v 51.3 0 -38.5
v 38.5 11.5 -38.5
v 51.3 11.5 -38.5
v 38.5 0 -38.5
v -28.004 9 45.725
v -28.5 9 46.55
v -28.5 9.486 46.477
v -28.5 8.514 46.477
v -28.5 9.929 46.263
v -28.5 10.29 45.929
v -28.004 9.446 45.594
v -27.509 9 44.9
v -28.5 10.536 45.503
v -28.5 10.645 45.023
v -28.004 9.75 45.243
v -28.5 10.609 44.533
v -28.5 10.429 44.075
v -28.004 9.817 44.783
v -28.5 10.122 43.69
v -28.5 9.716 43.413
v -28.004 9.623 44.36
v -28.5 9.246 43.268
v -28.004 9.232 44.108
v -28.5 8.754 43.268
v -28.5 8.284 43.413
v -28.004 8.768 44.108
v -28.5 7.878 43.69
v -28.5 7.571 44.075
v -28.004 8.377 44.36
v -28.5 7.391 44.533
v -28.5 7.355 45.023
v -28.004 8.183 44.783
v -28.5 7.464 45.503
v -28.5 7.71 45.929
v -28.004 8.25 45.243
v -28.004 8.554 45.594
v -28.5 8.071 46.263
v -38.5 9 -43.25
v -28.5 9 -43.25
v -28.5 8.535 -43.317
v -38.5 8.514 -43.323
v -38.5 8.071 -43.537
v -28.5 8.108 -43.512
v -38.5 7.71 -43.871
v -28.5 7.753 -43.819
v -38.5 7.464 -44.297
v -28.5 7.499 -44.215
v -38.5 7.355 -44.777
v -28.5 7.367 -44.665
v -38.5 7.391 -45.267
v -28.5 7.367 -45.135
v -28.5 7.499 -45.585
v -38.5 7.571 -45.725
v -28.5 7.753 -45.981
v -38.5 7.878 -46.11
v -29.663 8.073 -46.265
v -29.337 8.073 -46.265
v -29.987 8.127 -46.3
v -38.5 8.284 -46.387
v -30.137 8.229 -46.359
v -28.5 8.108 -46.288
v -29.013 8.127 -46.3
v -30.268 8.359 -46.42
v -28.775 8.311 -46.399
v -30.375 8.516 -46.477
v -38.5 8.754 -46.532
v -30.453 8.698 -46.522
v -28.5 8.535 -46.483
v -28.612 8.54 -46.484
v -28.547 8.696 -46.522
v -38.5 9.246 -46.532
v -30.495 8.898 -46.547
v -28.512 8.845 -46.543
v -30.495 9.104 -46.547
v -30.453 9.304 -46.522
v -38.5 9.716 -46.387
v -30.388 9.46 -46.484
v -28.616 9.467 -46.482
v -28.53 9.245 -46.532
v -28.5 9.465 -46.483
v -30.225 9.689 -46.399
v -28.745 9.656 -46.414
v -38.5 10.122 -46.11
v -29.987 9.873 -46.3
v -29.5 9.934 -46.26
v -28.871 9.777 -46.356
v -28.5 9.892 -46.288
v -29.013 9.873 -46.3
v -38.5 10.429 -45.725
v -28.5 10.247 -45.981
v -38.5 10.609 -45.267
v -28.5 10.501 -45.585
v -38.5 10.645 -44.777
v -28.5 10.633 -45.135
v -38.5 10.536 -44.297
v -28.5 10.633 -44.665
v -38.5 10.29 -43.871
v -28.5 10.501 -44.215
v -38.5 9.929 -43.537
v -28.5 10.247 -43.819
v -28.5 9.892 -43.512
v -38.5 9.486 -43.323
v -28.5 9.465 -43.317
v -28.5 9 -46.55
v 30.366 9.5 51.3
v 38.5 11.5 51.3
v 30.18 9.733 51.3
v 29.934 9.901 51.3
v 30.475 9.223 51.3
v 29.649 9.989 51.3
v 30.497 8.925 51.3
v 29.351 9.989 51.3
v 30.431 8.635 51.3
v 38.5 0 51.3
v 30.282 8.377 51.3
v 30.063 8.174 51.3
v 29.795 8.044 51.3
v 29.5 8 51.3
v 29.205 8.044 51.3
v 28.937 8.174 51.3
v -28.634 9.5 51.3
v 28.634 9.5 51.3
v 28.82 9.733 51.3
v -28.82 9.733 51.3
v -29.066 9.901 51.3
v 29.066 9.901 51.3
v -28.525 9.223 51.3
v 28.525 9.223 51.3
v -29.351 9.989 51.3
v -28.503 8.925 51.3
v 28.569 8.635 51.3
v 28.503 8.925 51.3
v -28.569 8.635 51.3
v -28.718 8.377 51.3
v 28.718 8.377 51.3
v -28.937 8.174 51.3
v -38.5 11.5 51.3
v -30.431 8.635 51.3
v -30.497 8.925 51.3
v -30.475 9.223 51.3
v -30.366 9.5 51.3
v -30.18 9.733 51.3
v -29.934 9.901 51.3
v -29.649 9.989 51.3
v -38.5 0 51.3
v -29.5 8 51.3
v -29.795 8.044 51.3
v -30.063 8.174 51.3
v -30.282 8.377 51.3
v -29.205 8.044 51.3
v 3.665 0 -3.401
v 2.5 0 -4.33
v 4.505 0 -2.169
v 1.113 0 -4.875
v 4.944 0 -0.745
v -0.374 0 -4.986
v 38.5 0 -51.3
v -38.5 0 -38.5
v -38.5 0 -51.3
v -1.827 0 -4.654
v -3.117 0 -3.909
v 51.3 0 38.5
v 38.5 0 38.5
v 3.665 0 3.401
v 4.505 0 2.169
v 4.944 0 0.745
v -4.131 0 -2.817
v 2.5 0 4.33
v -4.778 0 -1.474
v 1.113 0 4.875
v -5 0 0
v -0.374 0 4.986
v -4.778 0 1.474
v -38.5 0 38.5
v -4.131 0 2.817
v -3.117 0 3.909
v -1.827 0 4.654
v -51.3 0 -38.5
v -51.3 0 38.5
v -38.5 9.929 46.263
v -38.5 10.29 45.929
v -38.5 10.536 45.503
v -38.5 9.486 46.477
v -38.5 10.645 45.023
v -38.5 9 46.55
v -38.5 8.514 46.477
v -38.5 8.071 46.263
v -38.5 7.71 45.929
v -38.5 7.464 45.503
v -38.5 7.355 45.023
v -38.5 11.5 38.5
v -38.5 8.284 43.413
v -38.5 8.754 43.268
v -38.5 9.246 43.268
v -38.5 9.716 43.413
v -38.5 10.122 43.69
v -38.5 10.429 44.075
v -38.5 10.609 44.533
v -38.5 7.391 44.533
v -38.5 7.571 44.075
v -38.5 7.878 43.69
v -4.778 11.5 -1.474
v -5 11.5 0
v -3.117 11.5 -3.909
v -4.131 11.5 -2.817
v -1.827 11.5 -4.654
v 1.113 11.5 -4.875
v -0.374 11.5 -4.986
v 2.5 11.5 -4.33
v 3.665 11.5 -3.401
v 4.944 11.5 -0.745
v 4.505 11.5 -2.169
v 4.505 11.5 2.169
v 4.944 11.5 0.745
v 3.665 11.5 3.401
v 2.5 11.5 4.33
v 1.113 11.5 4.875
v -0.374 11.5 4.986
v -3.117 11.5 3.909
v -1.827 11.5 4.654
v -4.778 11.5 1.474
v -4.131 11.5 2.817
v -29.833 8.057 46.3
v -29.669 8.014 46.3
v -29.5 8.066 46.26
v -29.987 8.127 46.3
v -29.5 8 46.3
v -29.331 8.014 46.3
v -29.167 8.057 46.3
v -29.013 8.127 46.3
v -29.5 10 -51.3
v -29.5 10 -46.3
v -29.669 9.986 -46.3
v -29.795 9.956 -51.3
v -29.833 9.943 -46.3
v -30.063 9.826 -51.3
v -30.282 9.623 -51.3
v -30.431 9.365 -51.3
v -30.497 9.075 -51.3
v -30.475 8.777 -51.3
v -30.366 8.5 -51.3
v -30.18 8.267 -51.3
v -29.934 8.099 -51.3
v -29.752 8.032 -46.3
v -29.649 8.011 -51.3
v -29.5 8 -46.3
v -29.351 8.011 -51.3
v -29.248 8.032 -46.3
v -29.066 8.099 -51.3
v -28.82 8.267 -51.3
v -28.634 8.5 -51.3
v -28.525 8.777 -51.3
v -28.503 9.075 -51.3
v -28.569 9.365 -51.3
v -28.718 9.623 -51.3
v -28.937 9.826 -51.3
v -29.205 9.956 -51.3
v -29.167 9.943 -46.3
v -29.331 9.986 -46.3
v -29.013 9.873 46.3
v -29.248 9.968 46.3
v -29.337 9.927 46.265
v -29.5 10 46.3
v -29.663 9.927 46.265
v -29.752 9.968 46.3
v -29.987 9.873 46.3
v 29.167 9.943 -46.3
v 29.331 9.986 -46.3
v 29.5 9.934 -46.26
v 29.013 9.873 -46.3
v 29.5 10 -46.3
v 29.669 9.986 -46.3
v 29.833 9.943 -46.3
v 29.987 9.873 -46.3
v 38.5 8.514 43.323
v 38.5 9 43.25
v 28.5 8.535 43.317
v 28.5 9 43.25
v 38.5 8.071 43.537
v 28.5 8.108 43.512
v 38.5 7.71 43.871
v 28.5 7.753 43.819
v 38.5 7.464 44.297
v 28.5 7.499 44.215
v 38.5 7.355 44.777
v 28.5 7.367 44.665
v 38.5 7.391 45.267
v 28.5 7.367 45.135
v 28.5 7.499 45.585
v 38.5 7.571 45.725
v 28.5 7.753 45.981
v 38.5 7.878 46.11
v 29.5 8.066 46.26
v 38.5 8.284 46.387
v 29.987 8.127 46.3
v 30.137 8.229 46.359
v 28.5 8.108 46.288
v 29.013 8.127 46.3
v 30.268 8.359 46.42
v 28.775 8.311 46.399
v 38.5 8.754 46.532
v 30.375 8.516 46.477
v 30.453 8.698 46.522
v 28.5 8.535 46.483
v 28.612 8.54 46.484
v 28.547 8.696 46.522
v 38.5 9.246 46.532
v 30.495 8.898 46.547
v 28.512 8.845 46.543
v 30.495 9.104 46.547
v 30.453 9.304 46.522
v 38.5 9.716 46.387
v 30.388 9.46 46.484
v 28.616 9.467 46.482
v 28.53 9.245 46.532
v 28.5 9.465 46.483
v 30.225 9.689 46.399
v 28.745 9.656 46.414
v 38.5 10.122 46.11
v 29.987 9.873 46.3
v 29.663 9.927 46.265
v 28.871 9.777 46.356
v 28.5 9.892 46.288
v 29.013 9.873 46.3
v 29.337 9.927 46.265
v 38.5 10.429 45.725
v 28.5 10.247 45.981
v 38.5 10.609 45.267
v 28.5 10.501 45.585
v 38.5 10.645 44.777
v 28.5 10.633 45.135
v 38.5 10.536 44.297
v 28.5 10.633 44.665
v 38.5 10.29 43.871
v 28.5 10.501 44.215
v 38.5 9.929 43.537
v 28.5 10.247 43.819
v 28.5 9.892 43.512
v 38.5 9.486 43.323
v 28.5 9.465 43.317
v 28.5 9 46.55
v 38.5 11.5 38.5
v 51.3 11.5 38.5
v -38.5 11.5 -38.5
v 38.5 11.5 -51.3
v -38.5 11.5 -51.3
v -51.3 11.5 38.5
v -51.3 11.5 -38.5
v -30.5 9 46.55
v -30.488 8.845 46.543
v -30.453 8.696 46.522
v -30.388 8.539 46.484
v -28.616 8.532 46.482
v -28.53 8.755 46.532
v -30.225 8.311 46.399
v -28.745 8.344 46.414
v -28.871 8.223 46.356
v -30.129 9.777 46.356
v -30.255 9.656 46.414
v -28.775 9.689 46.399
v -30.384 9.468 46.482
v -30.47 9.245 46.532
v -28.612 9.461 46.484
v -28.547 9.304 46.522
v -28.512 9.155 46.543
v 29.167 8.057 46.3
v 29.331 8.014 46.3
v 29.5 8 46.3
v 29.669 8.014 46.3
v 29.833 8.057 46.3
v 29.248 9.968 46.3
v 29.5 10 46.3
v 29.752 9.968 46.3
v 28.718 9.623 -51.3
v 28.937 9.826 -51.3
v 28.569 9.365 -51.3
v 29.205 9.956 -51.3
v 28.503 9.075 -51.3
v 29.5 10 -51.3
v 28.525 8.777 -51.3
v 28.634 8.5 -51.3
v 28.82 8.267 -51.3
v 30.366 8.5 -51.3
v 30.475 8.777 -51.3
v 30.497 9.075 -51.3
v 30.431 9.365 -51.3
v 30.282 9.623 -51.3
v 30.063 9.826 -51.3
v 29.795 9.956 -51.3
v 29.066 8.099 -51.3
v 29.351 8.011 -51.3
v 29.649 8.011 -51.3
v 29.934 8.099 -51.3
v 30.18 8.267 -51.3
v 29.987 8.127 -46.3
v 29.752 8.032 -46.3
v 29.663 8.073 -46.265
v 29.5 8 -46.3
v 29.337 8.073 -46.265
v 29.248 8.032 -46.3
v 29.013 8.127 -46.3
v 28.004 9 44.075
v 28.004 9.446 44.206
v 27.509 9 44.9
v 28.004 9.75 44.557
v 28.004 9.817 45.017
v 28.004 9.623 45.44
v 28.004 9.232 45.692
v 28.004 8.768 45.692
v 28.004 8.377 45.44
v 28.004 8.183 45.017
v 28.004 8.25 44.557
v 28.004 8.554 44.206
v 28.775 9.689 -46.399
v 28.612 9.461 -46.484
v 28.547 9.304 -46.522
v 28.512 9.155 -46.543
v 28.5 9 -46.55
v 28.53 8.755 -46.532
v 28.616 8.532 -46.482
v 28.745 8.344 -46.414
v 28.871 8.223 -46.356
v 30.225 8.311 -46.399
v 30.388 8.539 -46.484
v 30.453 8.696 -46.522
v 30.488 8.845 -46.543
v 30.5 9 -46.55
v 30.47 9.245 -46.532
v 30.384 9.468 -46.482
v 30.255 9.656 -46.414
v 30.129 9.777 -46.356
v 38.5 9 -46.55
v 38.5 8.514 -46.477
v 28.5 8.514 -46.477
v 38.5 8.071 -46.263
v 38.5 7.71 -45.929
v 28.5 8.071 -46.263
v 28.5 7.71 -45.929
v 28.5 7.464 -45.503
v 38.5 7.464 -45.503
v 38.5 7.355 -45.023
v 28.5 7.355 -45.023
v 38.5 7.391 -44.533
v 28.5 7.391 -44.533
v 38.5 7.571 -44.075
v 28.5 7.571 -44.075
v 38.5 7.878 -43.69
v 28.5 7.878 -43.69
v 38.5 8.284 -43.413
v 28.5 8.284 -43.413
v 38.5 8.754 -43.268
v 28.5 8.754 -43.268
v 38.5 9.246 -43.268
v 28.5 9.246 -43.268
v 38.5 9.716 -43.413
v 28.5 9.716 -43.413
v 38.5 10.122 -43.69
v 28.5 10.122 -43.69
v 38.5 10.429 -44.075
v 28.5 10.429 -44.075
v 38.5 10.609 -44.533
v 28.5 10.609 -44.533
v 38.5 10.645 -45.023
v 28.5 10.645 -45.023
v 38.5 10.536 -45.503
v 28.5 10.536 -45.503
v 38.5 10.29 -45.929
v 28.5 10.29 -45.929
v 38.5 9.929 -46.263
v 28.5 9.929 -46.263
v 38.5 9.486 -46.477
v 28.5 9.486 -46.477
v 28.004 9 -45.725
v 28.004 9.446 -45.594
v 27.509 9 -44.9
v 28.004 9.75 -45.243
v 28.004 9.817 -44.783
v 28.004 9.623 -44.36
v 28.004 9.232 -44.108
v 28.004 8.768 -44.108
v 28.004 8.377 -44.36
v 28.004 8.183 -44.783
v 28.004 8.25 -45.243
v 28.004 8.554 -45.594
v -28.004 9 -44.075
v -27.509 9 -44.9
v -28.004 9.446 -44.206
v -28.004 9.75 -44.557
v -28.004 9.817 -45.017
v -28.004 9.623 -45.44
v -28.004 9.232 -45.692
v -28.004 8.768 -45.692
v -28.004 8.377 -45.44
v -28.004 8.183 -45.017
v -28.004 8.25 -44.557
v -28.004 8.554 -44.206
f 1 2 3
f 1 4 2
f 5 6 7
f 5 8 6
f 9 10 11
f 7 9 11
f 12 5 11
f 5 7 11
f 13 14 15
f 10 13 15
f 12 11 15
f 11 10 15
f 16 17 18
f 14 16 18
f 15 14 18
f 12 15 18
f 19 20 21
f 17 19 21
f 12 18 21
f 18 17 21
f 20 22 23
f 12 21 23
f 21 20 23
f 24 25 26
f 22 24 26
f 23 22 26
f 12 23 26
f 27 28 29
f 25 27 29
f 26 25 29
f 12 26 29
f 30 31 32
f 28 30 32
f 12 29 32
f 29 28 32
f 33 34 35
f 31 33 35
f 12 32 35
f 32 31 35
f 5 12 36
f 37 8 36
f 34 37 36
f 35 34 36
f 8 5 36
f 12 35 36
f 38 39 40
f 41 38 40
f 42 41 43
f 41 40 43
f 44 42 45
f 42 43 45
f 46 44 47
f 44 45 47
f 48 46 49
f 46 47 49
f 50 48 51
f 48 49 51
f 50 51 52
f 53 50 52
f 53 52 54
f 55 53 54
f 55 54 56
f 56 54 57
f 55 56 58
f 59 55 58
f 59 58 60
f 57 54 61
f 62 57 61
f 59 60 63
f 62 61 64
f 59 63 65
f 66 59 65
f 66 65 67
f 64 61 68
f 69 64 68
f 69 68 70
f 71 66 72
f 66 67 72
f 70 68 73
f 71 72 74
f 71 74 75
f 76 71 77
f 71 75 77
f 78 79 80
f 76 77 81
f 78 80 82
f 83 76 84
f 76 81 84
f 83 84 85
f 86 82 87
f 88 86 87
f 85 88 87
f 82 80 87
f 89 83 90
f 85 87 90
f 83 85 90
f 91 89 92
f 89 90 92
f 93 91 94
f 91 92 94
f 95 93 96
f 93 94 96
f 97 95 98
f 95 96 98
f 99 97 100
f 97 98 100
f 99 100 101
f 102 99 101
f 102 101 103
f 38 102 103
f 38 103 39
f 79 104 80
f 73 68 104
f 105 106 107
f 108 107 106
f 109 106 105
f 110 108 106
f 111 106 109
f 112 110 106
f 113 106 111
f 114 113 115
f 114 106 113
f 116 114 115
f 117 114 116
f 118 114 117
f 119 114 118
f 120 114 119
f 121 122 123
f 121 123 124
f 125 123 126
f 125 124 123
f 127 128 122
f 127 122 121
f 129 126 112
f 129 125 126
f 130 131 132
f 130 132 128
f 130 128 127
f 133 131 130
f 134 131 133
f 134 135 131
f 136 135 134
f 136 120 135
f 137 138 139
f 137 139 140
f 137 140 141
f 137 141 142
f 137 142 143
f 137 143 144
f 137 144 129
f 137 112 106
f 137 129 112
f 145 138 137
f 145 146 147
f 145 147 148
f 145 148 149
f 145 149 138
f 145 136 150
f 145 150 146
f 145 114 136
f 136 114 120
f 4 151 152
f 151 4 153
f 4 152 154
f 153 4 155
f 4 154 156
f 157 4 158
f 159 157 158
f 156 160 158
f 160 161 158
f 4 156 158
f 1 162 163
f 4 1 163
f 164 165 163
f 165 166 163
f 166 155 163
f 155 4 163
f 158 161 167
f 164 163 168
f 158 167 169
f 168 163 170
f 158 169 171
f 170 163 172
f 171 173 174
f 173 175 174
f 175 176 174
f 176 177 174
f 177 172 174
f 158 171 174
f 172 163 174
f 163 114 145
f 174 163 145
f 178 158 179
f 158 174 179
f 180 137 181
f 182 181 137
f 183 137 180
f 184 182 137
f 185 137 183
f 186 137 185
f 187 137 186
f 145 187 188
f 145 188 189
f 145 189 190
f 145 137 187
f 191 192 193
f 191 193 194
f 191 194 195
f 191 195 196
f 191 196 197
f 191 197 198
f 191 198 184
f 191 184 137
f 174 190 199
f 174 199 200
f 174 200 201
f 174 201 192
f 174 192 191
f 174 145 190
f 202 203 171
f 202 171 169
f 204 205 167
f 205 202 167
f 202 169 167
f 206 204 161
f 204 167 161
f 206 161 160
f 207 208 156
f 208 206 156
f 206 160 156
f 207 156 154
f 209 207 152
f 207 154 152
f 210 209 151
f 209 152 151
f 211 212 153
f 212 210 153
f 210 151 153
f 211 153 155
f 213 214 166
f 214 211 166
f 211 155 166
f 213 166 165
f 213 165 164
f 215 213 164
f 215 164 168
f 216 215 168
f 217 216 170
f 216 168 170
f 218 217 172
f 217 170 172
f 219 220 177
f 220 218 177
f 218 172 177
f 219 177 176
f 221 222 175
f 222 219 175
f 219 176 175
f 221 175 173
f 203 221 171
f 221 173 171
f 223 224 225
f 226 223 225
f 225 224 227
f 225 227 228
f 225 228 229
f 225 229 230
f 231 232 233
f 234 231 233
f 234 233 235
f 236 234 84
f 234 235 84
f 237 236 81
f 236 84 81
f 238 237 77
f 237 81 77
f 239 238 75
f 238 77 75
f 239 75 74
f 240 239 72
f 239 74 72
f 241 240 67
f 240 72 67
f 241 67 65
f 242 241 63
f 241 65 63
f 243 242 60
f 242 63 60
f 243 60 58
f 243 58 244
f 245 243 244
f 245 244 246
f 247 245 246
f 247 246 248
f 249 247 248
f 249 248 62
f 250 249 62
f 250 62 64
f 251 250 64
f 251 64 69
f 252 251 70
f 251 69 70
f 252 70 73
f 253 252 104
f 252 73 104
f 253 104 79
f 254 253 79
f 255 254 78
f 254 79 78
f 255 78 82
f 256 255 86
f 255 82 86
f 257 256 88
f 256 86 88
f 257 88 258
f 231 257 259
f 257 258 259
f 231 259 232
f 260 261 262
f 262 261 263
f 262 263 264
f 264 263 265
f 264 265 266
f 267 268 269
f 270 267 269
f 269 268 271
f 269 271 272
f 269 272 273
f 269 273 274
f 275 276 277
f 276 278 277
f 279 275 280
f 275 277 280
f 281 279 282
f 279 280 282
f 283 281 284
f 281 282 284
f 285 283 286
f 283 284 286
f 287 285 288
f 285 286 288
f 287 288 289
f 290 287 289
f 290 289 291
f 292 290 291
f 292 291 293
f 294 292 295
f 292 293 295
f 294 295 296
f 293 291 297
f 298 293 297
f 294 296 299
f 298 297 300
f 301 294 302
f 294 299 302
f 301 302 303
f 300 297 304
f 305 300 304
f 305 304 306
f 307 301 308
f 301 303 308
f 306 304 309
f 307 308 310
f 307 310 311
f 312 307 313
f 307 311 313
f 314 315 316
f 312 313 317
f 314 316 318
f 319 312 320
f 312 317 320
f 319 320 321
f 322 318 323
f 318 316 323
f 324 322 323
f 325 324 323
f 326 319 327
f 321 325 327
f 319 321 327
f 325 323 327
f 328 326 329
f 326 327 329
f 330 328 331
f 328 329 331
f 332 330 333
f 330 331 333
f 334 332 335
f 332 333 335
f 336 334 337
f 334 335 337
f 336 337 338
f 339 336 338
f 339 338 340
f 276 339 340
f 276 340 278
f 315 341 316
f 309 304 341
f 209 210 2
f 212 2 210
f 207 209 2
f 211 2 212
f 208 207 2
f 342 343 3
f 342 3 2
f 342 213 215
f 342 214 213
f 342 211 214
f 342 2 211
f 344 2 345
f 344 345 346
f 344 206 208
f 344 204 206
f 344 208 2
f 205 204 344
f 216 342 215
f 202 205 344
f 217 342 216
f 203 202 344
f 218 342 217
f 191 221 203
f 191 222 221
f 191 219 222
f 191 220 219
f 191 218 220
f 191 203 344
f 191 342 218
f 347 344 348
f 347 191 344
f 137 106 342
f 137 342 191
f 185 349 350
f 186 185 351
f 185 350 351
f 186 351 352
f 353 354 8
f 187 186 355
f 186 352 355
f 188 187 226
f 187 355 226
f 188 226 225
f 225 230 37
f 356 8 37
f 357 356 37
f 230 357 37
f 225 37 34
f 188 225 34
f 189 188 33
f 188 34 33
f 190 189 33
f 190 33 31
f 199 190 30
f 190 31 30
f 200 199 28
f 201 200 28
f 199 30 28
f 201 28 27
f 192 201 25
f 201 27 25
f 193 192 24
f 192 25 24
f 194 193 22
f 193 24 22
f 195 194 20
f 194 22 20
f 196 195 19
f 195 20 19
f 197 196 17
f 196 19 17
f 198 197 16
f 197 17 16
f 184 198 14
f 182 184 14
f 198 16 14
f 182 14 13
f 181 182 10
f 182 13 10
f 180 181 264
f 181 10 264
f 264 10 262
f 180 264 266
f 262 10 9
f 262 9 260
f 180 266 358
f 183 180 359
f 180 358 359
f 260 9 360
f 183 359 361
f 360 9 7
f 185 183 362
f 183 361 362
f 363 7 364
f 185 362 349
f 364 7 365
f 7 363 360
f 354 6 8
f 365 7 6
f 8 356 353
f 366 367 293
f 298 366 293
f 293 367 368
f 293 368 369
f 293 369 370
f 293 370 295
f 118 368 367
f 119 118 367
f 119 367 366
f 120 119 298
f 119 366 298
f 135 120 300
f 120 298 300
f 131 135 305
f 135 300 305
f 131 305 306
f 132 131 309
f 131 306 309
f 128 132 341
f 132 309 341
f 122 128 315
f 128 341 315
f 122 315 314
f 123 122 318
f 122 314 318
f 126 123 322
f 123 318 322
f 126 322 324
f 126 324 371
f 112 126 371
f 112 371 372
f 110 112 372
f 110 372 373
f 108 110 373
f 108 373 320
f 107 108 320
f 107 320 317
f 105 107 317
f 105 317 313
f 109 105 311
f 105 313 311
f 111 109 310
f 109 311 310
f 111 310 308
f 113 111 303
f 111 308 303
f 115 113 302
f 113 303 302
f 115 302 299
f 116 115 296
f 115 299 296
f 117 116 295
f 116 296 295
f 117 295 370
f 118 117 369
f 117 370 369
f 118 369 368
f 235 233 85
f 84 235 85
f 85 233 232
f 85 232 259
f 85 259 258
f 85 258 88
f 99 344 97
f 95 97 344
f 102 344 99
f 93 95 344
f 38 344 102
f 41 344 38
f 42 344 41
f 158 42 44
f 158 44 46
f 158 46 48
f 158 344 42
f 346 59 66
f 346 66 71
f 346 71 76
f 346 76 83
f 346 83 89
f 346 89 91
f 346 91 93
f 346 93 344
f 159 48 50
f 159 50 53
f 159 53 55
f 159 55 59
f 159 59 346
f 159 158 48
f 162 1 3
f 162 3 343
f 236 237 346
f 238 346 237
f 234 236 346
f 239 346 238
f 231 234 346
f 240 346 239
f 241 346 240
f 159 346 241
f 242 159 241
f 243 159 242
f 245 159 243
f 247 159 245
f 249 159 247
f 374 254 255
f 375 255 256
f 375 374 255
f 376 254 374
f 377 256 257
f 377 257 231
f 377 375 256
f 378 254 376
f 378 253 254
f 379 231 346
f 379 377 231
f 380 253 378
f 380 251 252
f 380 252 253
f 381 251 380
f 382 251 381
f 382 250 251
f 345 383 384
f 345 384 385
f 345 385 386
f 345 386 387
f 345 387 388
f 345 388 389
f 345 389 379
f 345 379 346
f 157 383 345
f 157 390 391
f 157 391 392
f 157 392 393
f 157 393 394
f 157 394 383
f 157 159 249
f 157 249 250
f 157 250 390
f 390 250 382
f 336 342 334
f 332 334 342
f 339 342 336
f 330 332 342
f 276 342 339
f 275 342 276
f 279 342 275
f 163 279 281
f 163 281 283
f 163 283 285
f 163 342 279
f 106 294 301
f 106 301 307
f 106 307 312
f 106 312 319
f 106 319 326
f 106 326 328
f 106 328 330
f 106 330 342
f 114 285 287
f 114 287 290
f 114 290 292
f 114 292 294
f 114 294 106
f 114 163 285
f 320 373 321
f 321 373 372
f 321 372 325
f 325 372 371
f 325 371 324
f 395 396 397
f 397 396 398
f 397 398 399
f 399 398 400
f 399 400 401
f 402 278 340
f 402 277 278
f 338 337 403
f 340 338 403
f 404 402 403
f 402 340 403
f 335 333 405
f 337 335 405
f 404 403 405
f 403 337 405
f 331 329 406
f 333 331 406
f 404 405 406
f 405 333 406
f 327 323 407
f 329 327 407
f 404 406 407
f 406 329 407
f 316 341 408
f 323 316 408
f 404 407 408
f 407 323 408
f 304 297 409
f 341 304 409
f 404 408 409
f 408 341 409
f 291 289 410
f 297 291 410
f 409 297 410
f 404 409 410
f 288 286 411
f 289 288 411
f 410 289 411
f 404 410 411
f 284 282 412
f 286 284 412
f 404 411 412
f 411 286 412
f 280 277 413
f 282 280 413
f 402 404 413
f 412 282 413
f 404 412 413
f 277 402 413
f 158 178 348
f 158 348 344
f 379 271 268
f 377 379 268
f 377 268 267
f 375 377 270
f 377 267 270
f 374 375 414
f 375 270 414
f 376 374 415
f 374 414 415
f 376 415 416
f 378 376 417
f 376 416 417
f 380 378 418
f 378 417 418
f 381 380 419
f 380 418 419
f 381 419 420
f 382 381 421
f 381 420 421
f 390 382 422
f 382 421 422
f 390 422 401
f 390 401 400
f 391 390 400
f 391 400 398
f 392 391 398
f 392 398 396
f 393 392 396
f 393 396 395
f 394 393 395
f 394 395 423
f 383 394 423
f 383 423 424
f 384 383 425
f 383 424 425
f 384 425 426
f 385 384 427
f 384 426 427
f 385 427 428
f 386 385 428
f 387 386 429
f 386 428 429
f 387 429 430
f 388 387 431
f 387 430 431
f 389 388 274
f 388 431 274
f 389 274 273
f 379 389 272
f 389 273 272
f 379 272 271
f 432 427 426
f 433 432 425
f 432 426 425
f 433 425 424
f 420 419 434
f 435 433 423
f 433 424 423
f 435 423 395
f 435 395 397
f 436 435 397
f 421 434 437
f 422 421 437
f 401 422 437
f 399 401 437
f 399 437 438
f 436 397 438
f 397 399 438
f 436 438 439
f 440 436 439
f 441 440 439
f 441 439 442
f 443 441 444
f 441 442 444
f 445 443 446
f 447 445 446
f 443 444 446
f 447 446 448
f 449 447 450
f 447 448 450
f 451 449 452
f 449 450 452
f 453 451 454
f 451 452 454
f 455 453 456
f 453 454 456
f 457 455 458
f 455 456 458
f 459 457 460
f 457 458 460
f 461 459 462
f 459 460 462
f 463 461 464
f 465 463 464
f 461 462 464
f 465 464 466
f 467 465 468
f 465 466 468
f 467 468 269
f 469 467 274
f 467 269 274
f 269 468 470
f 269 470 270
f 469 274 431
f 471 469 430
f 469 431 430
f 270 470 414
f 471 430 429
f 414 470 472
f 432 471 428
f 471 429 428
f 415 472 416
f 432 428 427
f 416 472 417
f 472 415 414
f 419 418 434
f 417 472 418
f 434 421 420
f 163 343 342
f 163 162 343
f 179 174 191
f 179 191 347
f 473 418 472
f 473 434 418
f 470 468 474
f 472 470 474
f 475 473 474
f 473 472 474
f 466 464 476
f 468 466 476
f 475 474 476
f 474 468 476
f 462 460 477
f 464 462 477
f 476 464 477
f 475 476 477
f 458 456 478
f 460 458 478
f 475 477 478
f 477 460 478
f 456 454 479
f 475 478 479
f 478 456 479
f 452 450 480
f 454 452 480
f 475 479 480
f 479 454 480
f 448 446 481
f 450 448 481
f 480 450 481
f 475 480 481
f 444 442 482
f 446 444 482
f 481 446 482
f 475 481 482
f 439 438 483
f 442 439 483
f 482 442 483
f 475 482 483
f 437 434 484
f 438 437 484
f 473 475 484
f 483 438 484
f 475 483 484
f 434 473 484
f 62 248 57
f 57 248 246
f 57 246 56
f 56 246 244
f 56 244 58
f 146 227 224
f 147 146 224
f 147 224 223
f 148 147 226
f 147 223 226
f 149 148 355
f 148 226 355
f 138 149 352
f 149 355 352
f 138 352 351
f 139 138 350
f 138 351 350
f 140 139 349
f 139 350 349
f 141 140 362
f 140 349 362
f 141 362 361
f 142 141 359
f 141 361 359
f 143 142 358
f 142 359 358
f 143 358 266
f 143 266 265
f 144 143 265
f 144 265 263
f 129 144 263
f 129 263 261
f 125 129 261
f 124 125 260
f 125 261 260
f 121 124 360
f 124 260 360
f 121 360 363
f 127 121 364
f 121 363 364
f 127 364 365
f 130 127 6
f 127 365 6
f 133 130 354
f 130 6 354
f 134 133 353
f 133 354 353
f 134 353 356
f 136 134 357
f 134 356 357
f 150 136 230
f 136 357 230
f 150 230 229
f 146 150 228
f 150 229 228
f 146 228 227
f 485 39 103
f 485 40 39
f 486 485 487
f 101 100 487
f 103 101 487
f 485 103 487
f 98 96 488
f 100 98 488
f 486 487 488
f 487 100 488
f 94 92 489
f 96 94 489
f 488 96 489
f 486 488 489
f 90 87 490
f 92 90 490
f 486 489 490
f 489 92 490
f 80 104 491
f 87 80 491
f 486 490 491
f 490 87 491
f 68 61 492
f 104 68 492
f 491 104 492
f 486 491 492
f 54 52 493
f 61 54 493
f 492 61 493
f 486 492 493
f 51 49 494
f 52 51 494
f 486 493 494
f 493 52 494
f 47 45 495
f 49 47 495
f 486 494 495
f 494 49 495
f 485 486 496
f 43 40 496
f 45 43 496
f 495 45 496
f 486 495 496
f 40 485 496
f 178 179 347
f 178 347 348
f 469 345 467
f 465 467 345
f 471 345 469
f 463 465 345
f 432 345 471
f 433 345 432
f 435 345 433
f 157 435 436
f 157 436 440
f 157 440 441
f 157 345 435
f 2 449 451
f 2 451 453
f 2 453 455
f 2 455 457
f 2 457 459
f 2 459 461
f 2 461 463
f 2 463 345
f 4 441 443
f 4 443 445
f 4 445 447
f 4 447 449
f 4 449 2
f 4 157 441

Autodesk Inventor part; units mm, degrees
ref_plane "YZ Plane" through (0, 0, 0) normal (1, 0, 0) x (0, 1, 0)
ref_plane "XZ Plane" through (0, 0, 0) normal (0, 1, 0) x (-1, 0, 0)
ref_plane "XY Plane" through (0, 0, 0) normal (0, 0, 1) x (1, 0, 0)
sketch "Sketch1" plane through (0, 0, 0) normal (0, 1, 0) x (-1, 0, 0)
  line L0 (51.3, 38.5) -> (51.3, -38.5)
  line L1 (51.3, -38.5) -> (38.5, -38.5)
  line L2 (38.5, -38.5) -> (38.5, -51.3)
  line L3 (38.5, -51.3) -> (-38.5, -51.3)
  line L4 (-38.5, -51.3) -> (-38.5, -38.5)
  line L5 (-38.5, -38.5) -> (-51.3, -38.5)
  line L6 (-51.3, -38.5) -> (-51.3, 38.5)
  line L7 (-51.3, 38.5) -> (-38.5, 38.5)
  line L8 (-38.5, 38.5) -> (-38.5, 51.3)
  line L9 (-38.5, 51.3) -> (38.5, 51.3)
  line L10 (38.5, 51.3) -> (38.5, 38.5)
  line L11 (38.5, 38.5) -> (51.3, 38.5)
  circle A0 centre (0, 0) radius 5
  dimension "d0" = 77
  dimension "d1" = 12.8
  dimension "d2" = 12.8
  dimension "d3" = 77
  dimension "d4" = 12.8
  dimension "d5" = 12.8
  dimension "d6" = 77
  dimension "d7" = 12.8
  dimension "d8" = 12.8
  dimension "d9" = 77
  dimension "d10" = 12.8
  dimension "d11" = 12.8
  dimension "d12" = 38.5
  dimension "d13" = 51.3
  dimension "d14" = 10
extrude "Extrusion1" add sketch "Sketch1" along normal blind 11.5
sketch "Sketch2" plane through (38.5, 0, 51.3) normal (1, 0, 0) x (0, 0, -1)
  circle A0 centre (6.4, 9) radius 1.65
  line L0 (0, 0) -> (0, 11.5) projected
  line L1 (0, 11.5) -> (12.8, 11.5) projected
  point P0 (51.3, 0)
  dimension "d17" = 3.3
  dimension "d18" = 6.4
  dimension "d19" = 2.5
hole "Hole1" at (38.5, 9, 44.9) direction (-1, 0, 0) diameter 3.3 depth 10 tip angle 118
thread "Thread1" size "M3.5x0.6" class "6H" standard "ANSI Metric M Profile" full length
sketch "Sketch3" plane through (-38.5, 0, 51.3) normal (0, 0, 1) x (1, 0, 0)
  circle A0 centre (68, 9) radius 0.5
  line L0 (0, 11.5) -> (77, 11.5) projected
  line L1 (77, 0) -> (77, 11.5) projected
  point P0 (38.5, 0)
  dimension "d29" = 1
  dimension "d30" = 2.5
  dimension "d31" = 9
hole "Hole2" at (29.5, 9, 51.3) direction (0, 0, -1) diameter 2 depth 5 tip angle 118
sketch "Sketch4" plane through (-38.5, 0, 38.5) normal (-1, 0, 0) x (0, 0, 1)
  circle A0 centre (6.4, 9) radius 1.65
  line L0 (0, 11.5) -> (12.8, 11.5) projected
  line L1 (12.8, 0) -> (12.8, 11.5) projected
  point P0 (-38.5, 0)
  dimension "d39" = 3.3
  dimension "d40" = 2.5
  dimension "d41" = 6.4
hole "Hole3" at (-38.5, 9, 44.9) direction (1, 0, 0) diameter 3.3 depth 10 tip angle 118
thread "Thread2" size "M3.5x0.6" class "6H" standard "ANSI Metric M Profile" full length
sketch "Sketch5" plane through (-38.5, 0, 51.3) normal (0, 0, 1) x (1, 0, 0)
  circle A0 centre (9, 9) radius 1
  line L0 (0, 0) -> (0, 11.5) projected
  line L1 (0, 11.5) -> (77, 11.5) projected
  point P0 (38.5, 0)
  dimension "d51" = 2
  dimension "d52" = 9
  dimension "d53" = 2.5
hole "Hole4" at (-29.5, 9, 51.3) direction (0, 0, -1) diameter 2 depth 5 tip angle 118
sketch "Sketch6" plane through (38.5, 0, -38.5) normal (1, 0, 0) x (0, 0, -1)
  circle A0 centre (6.4, 9) radius 1.65
  line L0 (0, 11.5) -> (12.8, 11.5) projected
  line L1 (12.8, 0) -> (12.8, 11.5) projected
  point P0 (-38.5, 0)
  dimension "d61" = 3.3
  dimension "d62" = 2.5
  dimension "d63" = 6.4
hole "Hole5" at (38.5, 9, -44.9) direction (-1, 0, 0) diameter 3.3 depth 10 tip angle 118
thread "Thread3" size "M3.5x0.6" class "6H" standard "ANSI Metric M Profile" full length
sketch "Sketch7" plane through (38.5, 0, -51.3) normal (0, 0, -1) x (-1, 0, 0)
  circle A0 centre (9, 9) radius 1
  line L0 (0, 0) -> (0, 11.5) projected
  line L1 (0, 11.5) -> (77, 11.5) projected
  point P0 (38.5, 0)
  dimension "d73" = 2
  dimension "d74" = 9
  dimension "d75" = 2.5
hole "Hole6" at (29.5, 9, -51.3) direction (0, 0, 1) diameter 2 depth 5 tip angle 118
sketch "Sketch8" plane through (-38.5, 0, -51.3) normal (-1, 0, 0) x (0, 0, 1)
  circle A0 centre (6.4, 9) radius 1.65
  line L0 (0, 11.5) -> (12.8, 11.5) projected
  line L1 (0, 0) -> (0, 11.5) projected
  point P0 (51.3, 0)
  dimension "d83" = 3.3
  dimension "d84" = 2.5
  dimension "d85" = 6.4
hole "Hole7" at (-38.5, 9, -44.9) direction (1, 0, 0) diameter 3.3 depth 10 tip angle 118
thread "Thread4" size "M3.5x0.6" class "6H" standard "ANSI Metric M Profile" full length
sketch "Sketch9" plane through (38.5, 0, -51.3) normal (0, 0, -1) x (-1, 0, 0)
  circle A0 centre (68, 9) radius 1
  line L0 (0, 11.5) -> (77, 11.5) projected
  line L1 (77, 0) -> (77, 11.5) projected
  point P0 (38.5, 0)
  dimension "d95" = 2
  dimension "d96" = 2.5
  dimension "d97" = 9
hole "Hole8" at (-29.5, 9, -51.3) direction (0, 0, 1) diameter 2 depth 5 tip angle 118
properties part number "PEEKplate"
